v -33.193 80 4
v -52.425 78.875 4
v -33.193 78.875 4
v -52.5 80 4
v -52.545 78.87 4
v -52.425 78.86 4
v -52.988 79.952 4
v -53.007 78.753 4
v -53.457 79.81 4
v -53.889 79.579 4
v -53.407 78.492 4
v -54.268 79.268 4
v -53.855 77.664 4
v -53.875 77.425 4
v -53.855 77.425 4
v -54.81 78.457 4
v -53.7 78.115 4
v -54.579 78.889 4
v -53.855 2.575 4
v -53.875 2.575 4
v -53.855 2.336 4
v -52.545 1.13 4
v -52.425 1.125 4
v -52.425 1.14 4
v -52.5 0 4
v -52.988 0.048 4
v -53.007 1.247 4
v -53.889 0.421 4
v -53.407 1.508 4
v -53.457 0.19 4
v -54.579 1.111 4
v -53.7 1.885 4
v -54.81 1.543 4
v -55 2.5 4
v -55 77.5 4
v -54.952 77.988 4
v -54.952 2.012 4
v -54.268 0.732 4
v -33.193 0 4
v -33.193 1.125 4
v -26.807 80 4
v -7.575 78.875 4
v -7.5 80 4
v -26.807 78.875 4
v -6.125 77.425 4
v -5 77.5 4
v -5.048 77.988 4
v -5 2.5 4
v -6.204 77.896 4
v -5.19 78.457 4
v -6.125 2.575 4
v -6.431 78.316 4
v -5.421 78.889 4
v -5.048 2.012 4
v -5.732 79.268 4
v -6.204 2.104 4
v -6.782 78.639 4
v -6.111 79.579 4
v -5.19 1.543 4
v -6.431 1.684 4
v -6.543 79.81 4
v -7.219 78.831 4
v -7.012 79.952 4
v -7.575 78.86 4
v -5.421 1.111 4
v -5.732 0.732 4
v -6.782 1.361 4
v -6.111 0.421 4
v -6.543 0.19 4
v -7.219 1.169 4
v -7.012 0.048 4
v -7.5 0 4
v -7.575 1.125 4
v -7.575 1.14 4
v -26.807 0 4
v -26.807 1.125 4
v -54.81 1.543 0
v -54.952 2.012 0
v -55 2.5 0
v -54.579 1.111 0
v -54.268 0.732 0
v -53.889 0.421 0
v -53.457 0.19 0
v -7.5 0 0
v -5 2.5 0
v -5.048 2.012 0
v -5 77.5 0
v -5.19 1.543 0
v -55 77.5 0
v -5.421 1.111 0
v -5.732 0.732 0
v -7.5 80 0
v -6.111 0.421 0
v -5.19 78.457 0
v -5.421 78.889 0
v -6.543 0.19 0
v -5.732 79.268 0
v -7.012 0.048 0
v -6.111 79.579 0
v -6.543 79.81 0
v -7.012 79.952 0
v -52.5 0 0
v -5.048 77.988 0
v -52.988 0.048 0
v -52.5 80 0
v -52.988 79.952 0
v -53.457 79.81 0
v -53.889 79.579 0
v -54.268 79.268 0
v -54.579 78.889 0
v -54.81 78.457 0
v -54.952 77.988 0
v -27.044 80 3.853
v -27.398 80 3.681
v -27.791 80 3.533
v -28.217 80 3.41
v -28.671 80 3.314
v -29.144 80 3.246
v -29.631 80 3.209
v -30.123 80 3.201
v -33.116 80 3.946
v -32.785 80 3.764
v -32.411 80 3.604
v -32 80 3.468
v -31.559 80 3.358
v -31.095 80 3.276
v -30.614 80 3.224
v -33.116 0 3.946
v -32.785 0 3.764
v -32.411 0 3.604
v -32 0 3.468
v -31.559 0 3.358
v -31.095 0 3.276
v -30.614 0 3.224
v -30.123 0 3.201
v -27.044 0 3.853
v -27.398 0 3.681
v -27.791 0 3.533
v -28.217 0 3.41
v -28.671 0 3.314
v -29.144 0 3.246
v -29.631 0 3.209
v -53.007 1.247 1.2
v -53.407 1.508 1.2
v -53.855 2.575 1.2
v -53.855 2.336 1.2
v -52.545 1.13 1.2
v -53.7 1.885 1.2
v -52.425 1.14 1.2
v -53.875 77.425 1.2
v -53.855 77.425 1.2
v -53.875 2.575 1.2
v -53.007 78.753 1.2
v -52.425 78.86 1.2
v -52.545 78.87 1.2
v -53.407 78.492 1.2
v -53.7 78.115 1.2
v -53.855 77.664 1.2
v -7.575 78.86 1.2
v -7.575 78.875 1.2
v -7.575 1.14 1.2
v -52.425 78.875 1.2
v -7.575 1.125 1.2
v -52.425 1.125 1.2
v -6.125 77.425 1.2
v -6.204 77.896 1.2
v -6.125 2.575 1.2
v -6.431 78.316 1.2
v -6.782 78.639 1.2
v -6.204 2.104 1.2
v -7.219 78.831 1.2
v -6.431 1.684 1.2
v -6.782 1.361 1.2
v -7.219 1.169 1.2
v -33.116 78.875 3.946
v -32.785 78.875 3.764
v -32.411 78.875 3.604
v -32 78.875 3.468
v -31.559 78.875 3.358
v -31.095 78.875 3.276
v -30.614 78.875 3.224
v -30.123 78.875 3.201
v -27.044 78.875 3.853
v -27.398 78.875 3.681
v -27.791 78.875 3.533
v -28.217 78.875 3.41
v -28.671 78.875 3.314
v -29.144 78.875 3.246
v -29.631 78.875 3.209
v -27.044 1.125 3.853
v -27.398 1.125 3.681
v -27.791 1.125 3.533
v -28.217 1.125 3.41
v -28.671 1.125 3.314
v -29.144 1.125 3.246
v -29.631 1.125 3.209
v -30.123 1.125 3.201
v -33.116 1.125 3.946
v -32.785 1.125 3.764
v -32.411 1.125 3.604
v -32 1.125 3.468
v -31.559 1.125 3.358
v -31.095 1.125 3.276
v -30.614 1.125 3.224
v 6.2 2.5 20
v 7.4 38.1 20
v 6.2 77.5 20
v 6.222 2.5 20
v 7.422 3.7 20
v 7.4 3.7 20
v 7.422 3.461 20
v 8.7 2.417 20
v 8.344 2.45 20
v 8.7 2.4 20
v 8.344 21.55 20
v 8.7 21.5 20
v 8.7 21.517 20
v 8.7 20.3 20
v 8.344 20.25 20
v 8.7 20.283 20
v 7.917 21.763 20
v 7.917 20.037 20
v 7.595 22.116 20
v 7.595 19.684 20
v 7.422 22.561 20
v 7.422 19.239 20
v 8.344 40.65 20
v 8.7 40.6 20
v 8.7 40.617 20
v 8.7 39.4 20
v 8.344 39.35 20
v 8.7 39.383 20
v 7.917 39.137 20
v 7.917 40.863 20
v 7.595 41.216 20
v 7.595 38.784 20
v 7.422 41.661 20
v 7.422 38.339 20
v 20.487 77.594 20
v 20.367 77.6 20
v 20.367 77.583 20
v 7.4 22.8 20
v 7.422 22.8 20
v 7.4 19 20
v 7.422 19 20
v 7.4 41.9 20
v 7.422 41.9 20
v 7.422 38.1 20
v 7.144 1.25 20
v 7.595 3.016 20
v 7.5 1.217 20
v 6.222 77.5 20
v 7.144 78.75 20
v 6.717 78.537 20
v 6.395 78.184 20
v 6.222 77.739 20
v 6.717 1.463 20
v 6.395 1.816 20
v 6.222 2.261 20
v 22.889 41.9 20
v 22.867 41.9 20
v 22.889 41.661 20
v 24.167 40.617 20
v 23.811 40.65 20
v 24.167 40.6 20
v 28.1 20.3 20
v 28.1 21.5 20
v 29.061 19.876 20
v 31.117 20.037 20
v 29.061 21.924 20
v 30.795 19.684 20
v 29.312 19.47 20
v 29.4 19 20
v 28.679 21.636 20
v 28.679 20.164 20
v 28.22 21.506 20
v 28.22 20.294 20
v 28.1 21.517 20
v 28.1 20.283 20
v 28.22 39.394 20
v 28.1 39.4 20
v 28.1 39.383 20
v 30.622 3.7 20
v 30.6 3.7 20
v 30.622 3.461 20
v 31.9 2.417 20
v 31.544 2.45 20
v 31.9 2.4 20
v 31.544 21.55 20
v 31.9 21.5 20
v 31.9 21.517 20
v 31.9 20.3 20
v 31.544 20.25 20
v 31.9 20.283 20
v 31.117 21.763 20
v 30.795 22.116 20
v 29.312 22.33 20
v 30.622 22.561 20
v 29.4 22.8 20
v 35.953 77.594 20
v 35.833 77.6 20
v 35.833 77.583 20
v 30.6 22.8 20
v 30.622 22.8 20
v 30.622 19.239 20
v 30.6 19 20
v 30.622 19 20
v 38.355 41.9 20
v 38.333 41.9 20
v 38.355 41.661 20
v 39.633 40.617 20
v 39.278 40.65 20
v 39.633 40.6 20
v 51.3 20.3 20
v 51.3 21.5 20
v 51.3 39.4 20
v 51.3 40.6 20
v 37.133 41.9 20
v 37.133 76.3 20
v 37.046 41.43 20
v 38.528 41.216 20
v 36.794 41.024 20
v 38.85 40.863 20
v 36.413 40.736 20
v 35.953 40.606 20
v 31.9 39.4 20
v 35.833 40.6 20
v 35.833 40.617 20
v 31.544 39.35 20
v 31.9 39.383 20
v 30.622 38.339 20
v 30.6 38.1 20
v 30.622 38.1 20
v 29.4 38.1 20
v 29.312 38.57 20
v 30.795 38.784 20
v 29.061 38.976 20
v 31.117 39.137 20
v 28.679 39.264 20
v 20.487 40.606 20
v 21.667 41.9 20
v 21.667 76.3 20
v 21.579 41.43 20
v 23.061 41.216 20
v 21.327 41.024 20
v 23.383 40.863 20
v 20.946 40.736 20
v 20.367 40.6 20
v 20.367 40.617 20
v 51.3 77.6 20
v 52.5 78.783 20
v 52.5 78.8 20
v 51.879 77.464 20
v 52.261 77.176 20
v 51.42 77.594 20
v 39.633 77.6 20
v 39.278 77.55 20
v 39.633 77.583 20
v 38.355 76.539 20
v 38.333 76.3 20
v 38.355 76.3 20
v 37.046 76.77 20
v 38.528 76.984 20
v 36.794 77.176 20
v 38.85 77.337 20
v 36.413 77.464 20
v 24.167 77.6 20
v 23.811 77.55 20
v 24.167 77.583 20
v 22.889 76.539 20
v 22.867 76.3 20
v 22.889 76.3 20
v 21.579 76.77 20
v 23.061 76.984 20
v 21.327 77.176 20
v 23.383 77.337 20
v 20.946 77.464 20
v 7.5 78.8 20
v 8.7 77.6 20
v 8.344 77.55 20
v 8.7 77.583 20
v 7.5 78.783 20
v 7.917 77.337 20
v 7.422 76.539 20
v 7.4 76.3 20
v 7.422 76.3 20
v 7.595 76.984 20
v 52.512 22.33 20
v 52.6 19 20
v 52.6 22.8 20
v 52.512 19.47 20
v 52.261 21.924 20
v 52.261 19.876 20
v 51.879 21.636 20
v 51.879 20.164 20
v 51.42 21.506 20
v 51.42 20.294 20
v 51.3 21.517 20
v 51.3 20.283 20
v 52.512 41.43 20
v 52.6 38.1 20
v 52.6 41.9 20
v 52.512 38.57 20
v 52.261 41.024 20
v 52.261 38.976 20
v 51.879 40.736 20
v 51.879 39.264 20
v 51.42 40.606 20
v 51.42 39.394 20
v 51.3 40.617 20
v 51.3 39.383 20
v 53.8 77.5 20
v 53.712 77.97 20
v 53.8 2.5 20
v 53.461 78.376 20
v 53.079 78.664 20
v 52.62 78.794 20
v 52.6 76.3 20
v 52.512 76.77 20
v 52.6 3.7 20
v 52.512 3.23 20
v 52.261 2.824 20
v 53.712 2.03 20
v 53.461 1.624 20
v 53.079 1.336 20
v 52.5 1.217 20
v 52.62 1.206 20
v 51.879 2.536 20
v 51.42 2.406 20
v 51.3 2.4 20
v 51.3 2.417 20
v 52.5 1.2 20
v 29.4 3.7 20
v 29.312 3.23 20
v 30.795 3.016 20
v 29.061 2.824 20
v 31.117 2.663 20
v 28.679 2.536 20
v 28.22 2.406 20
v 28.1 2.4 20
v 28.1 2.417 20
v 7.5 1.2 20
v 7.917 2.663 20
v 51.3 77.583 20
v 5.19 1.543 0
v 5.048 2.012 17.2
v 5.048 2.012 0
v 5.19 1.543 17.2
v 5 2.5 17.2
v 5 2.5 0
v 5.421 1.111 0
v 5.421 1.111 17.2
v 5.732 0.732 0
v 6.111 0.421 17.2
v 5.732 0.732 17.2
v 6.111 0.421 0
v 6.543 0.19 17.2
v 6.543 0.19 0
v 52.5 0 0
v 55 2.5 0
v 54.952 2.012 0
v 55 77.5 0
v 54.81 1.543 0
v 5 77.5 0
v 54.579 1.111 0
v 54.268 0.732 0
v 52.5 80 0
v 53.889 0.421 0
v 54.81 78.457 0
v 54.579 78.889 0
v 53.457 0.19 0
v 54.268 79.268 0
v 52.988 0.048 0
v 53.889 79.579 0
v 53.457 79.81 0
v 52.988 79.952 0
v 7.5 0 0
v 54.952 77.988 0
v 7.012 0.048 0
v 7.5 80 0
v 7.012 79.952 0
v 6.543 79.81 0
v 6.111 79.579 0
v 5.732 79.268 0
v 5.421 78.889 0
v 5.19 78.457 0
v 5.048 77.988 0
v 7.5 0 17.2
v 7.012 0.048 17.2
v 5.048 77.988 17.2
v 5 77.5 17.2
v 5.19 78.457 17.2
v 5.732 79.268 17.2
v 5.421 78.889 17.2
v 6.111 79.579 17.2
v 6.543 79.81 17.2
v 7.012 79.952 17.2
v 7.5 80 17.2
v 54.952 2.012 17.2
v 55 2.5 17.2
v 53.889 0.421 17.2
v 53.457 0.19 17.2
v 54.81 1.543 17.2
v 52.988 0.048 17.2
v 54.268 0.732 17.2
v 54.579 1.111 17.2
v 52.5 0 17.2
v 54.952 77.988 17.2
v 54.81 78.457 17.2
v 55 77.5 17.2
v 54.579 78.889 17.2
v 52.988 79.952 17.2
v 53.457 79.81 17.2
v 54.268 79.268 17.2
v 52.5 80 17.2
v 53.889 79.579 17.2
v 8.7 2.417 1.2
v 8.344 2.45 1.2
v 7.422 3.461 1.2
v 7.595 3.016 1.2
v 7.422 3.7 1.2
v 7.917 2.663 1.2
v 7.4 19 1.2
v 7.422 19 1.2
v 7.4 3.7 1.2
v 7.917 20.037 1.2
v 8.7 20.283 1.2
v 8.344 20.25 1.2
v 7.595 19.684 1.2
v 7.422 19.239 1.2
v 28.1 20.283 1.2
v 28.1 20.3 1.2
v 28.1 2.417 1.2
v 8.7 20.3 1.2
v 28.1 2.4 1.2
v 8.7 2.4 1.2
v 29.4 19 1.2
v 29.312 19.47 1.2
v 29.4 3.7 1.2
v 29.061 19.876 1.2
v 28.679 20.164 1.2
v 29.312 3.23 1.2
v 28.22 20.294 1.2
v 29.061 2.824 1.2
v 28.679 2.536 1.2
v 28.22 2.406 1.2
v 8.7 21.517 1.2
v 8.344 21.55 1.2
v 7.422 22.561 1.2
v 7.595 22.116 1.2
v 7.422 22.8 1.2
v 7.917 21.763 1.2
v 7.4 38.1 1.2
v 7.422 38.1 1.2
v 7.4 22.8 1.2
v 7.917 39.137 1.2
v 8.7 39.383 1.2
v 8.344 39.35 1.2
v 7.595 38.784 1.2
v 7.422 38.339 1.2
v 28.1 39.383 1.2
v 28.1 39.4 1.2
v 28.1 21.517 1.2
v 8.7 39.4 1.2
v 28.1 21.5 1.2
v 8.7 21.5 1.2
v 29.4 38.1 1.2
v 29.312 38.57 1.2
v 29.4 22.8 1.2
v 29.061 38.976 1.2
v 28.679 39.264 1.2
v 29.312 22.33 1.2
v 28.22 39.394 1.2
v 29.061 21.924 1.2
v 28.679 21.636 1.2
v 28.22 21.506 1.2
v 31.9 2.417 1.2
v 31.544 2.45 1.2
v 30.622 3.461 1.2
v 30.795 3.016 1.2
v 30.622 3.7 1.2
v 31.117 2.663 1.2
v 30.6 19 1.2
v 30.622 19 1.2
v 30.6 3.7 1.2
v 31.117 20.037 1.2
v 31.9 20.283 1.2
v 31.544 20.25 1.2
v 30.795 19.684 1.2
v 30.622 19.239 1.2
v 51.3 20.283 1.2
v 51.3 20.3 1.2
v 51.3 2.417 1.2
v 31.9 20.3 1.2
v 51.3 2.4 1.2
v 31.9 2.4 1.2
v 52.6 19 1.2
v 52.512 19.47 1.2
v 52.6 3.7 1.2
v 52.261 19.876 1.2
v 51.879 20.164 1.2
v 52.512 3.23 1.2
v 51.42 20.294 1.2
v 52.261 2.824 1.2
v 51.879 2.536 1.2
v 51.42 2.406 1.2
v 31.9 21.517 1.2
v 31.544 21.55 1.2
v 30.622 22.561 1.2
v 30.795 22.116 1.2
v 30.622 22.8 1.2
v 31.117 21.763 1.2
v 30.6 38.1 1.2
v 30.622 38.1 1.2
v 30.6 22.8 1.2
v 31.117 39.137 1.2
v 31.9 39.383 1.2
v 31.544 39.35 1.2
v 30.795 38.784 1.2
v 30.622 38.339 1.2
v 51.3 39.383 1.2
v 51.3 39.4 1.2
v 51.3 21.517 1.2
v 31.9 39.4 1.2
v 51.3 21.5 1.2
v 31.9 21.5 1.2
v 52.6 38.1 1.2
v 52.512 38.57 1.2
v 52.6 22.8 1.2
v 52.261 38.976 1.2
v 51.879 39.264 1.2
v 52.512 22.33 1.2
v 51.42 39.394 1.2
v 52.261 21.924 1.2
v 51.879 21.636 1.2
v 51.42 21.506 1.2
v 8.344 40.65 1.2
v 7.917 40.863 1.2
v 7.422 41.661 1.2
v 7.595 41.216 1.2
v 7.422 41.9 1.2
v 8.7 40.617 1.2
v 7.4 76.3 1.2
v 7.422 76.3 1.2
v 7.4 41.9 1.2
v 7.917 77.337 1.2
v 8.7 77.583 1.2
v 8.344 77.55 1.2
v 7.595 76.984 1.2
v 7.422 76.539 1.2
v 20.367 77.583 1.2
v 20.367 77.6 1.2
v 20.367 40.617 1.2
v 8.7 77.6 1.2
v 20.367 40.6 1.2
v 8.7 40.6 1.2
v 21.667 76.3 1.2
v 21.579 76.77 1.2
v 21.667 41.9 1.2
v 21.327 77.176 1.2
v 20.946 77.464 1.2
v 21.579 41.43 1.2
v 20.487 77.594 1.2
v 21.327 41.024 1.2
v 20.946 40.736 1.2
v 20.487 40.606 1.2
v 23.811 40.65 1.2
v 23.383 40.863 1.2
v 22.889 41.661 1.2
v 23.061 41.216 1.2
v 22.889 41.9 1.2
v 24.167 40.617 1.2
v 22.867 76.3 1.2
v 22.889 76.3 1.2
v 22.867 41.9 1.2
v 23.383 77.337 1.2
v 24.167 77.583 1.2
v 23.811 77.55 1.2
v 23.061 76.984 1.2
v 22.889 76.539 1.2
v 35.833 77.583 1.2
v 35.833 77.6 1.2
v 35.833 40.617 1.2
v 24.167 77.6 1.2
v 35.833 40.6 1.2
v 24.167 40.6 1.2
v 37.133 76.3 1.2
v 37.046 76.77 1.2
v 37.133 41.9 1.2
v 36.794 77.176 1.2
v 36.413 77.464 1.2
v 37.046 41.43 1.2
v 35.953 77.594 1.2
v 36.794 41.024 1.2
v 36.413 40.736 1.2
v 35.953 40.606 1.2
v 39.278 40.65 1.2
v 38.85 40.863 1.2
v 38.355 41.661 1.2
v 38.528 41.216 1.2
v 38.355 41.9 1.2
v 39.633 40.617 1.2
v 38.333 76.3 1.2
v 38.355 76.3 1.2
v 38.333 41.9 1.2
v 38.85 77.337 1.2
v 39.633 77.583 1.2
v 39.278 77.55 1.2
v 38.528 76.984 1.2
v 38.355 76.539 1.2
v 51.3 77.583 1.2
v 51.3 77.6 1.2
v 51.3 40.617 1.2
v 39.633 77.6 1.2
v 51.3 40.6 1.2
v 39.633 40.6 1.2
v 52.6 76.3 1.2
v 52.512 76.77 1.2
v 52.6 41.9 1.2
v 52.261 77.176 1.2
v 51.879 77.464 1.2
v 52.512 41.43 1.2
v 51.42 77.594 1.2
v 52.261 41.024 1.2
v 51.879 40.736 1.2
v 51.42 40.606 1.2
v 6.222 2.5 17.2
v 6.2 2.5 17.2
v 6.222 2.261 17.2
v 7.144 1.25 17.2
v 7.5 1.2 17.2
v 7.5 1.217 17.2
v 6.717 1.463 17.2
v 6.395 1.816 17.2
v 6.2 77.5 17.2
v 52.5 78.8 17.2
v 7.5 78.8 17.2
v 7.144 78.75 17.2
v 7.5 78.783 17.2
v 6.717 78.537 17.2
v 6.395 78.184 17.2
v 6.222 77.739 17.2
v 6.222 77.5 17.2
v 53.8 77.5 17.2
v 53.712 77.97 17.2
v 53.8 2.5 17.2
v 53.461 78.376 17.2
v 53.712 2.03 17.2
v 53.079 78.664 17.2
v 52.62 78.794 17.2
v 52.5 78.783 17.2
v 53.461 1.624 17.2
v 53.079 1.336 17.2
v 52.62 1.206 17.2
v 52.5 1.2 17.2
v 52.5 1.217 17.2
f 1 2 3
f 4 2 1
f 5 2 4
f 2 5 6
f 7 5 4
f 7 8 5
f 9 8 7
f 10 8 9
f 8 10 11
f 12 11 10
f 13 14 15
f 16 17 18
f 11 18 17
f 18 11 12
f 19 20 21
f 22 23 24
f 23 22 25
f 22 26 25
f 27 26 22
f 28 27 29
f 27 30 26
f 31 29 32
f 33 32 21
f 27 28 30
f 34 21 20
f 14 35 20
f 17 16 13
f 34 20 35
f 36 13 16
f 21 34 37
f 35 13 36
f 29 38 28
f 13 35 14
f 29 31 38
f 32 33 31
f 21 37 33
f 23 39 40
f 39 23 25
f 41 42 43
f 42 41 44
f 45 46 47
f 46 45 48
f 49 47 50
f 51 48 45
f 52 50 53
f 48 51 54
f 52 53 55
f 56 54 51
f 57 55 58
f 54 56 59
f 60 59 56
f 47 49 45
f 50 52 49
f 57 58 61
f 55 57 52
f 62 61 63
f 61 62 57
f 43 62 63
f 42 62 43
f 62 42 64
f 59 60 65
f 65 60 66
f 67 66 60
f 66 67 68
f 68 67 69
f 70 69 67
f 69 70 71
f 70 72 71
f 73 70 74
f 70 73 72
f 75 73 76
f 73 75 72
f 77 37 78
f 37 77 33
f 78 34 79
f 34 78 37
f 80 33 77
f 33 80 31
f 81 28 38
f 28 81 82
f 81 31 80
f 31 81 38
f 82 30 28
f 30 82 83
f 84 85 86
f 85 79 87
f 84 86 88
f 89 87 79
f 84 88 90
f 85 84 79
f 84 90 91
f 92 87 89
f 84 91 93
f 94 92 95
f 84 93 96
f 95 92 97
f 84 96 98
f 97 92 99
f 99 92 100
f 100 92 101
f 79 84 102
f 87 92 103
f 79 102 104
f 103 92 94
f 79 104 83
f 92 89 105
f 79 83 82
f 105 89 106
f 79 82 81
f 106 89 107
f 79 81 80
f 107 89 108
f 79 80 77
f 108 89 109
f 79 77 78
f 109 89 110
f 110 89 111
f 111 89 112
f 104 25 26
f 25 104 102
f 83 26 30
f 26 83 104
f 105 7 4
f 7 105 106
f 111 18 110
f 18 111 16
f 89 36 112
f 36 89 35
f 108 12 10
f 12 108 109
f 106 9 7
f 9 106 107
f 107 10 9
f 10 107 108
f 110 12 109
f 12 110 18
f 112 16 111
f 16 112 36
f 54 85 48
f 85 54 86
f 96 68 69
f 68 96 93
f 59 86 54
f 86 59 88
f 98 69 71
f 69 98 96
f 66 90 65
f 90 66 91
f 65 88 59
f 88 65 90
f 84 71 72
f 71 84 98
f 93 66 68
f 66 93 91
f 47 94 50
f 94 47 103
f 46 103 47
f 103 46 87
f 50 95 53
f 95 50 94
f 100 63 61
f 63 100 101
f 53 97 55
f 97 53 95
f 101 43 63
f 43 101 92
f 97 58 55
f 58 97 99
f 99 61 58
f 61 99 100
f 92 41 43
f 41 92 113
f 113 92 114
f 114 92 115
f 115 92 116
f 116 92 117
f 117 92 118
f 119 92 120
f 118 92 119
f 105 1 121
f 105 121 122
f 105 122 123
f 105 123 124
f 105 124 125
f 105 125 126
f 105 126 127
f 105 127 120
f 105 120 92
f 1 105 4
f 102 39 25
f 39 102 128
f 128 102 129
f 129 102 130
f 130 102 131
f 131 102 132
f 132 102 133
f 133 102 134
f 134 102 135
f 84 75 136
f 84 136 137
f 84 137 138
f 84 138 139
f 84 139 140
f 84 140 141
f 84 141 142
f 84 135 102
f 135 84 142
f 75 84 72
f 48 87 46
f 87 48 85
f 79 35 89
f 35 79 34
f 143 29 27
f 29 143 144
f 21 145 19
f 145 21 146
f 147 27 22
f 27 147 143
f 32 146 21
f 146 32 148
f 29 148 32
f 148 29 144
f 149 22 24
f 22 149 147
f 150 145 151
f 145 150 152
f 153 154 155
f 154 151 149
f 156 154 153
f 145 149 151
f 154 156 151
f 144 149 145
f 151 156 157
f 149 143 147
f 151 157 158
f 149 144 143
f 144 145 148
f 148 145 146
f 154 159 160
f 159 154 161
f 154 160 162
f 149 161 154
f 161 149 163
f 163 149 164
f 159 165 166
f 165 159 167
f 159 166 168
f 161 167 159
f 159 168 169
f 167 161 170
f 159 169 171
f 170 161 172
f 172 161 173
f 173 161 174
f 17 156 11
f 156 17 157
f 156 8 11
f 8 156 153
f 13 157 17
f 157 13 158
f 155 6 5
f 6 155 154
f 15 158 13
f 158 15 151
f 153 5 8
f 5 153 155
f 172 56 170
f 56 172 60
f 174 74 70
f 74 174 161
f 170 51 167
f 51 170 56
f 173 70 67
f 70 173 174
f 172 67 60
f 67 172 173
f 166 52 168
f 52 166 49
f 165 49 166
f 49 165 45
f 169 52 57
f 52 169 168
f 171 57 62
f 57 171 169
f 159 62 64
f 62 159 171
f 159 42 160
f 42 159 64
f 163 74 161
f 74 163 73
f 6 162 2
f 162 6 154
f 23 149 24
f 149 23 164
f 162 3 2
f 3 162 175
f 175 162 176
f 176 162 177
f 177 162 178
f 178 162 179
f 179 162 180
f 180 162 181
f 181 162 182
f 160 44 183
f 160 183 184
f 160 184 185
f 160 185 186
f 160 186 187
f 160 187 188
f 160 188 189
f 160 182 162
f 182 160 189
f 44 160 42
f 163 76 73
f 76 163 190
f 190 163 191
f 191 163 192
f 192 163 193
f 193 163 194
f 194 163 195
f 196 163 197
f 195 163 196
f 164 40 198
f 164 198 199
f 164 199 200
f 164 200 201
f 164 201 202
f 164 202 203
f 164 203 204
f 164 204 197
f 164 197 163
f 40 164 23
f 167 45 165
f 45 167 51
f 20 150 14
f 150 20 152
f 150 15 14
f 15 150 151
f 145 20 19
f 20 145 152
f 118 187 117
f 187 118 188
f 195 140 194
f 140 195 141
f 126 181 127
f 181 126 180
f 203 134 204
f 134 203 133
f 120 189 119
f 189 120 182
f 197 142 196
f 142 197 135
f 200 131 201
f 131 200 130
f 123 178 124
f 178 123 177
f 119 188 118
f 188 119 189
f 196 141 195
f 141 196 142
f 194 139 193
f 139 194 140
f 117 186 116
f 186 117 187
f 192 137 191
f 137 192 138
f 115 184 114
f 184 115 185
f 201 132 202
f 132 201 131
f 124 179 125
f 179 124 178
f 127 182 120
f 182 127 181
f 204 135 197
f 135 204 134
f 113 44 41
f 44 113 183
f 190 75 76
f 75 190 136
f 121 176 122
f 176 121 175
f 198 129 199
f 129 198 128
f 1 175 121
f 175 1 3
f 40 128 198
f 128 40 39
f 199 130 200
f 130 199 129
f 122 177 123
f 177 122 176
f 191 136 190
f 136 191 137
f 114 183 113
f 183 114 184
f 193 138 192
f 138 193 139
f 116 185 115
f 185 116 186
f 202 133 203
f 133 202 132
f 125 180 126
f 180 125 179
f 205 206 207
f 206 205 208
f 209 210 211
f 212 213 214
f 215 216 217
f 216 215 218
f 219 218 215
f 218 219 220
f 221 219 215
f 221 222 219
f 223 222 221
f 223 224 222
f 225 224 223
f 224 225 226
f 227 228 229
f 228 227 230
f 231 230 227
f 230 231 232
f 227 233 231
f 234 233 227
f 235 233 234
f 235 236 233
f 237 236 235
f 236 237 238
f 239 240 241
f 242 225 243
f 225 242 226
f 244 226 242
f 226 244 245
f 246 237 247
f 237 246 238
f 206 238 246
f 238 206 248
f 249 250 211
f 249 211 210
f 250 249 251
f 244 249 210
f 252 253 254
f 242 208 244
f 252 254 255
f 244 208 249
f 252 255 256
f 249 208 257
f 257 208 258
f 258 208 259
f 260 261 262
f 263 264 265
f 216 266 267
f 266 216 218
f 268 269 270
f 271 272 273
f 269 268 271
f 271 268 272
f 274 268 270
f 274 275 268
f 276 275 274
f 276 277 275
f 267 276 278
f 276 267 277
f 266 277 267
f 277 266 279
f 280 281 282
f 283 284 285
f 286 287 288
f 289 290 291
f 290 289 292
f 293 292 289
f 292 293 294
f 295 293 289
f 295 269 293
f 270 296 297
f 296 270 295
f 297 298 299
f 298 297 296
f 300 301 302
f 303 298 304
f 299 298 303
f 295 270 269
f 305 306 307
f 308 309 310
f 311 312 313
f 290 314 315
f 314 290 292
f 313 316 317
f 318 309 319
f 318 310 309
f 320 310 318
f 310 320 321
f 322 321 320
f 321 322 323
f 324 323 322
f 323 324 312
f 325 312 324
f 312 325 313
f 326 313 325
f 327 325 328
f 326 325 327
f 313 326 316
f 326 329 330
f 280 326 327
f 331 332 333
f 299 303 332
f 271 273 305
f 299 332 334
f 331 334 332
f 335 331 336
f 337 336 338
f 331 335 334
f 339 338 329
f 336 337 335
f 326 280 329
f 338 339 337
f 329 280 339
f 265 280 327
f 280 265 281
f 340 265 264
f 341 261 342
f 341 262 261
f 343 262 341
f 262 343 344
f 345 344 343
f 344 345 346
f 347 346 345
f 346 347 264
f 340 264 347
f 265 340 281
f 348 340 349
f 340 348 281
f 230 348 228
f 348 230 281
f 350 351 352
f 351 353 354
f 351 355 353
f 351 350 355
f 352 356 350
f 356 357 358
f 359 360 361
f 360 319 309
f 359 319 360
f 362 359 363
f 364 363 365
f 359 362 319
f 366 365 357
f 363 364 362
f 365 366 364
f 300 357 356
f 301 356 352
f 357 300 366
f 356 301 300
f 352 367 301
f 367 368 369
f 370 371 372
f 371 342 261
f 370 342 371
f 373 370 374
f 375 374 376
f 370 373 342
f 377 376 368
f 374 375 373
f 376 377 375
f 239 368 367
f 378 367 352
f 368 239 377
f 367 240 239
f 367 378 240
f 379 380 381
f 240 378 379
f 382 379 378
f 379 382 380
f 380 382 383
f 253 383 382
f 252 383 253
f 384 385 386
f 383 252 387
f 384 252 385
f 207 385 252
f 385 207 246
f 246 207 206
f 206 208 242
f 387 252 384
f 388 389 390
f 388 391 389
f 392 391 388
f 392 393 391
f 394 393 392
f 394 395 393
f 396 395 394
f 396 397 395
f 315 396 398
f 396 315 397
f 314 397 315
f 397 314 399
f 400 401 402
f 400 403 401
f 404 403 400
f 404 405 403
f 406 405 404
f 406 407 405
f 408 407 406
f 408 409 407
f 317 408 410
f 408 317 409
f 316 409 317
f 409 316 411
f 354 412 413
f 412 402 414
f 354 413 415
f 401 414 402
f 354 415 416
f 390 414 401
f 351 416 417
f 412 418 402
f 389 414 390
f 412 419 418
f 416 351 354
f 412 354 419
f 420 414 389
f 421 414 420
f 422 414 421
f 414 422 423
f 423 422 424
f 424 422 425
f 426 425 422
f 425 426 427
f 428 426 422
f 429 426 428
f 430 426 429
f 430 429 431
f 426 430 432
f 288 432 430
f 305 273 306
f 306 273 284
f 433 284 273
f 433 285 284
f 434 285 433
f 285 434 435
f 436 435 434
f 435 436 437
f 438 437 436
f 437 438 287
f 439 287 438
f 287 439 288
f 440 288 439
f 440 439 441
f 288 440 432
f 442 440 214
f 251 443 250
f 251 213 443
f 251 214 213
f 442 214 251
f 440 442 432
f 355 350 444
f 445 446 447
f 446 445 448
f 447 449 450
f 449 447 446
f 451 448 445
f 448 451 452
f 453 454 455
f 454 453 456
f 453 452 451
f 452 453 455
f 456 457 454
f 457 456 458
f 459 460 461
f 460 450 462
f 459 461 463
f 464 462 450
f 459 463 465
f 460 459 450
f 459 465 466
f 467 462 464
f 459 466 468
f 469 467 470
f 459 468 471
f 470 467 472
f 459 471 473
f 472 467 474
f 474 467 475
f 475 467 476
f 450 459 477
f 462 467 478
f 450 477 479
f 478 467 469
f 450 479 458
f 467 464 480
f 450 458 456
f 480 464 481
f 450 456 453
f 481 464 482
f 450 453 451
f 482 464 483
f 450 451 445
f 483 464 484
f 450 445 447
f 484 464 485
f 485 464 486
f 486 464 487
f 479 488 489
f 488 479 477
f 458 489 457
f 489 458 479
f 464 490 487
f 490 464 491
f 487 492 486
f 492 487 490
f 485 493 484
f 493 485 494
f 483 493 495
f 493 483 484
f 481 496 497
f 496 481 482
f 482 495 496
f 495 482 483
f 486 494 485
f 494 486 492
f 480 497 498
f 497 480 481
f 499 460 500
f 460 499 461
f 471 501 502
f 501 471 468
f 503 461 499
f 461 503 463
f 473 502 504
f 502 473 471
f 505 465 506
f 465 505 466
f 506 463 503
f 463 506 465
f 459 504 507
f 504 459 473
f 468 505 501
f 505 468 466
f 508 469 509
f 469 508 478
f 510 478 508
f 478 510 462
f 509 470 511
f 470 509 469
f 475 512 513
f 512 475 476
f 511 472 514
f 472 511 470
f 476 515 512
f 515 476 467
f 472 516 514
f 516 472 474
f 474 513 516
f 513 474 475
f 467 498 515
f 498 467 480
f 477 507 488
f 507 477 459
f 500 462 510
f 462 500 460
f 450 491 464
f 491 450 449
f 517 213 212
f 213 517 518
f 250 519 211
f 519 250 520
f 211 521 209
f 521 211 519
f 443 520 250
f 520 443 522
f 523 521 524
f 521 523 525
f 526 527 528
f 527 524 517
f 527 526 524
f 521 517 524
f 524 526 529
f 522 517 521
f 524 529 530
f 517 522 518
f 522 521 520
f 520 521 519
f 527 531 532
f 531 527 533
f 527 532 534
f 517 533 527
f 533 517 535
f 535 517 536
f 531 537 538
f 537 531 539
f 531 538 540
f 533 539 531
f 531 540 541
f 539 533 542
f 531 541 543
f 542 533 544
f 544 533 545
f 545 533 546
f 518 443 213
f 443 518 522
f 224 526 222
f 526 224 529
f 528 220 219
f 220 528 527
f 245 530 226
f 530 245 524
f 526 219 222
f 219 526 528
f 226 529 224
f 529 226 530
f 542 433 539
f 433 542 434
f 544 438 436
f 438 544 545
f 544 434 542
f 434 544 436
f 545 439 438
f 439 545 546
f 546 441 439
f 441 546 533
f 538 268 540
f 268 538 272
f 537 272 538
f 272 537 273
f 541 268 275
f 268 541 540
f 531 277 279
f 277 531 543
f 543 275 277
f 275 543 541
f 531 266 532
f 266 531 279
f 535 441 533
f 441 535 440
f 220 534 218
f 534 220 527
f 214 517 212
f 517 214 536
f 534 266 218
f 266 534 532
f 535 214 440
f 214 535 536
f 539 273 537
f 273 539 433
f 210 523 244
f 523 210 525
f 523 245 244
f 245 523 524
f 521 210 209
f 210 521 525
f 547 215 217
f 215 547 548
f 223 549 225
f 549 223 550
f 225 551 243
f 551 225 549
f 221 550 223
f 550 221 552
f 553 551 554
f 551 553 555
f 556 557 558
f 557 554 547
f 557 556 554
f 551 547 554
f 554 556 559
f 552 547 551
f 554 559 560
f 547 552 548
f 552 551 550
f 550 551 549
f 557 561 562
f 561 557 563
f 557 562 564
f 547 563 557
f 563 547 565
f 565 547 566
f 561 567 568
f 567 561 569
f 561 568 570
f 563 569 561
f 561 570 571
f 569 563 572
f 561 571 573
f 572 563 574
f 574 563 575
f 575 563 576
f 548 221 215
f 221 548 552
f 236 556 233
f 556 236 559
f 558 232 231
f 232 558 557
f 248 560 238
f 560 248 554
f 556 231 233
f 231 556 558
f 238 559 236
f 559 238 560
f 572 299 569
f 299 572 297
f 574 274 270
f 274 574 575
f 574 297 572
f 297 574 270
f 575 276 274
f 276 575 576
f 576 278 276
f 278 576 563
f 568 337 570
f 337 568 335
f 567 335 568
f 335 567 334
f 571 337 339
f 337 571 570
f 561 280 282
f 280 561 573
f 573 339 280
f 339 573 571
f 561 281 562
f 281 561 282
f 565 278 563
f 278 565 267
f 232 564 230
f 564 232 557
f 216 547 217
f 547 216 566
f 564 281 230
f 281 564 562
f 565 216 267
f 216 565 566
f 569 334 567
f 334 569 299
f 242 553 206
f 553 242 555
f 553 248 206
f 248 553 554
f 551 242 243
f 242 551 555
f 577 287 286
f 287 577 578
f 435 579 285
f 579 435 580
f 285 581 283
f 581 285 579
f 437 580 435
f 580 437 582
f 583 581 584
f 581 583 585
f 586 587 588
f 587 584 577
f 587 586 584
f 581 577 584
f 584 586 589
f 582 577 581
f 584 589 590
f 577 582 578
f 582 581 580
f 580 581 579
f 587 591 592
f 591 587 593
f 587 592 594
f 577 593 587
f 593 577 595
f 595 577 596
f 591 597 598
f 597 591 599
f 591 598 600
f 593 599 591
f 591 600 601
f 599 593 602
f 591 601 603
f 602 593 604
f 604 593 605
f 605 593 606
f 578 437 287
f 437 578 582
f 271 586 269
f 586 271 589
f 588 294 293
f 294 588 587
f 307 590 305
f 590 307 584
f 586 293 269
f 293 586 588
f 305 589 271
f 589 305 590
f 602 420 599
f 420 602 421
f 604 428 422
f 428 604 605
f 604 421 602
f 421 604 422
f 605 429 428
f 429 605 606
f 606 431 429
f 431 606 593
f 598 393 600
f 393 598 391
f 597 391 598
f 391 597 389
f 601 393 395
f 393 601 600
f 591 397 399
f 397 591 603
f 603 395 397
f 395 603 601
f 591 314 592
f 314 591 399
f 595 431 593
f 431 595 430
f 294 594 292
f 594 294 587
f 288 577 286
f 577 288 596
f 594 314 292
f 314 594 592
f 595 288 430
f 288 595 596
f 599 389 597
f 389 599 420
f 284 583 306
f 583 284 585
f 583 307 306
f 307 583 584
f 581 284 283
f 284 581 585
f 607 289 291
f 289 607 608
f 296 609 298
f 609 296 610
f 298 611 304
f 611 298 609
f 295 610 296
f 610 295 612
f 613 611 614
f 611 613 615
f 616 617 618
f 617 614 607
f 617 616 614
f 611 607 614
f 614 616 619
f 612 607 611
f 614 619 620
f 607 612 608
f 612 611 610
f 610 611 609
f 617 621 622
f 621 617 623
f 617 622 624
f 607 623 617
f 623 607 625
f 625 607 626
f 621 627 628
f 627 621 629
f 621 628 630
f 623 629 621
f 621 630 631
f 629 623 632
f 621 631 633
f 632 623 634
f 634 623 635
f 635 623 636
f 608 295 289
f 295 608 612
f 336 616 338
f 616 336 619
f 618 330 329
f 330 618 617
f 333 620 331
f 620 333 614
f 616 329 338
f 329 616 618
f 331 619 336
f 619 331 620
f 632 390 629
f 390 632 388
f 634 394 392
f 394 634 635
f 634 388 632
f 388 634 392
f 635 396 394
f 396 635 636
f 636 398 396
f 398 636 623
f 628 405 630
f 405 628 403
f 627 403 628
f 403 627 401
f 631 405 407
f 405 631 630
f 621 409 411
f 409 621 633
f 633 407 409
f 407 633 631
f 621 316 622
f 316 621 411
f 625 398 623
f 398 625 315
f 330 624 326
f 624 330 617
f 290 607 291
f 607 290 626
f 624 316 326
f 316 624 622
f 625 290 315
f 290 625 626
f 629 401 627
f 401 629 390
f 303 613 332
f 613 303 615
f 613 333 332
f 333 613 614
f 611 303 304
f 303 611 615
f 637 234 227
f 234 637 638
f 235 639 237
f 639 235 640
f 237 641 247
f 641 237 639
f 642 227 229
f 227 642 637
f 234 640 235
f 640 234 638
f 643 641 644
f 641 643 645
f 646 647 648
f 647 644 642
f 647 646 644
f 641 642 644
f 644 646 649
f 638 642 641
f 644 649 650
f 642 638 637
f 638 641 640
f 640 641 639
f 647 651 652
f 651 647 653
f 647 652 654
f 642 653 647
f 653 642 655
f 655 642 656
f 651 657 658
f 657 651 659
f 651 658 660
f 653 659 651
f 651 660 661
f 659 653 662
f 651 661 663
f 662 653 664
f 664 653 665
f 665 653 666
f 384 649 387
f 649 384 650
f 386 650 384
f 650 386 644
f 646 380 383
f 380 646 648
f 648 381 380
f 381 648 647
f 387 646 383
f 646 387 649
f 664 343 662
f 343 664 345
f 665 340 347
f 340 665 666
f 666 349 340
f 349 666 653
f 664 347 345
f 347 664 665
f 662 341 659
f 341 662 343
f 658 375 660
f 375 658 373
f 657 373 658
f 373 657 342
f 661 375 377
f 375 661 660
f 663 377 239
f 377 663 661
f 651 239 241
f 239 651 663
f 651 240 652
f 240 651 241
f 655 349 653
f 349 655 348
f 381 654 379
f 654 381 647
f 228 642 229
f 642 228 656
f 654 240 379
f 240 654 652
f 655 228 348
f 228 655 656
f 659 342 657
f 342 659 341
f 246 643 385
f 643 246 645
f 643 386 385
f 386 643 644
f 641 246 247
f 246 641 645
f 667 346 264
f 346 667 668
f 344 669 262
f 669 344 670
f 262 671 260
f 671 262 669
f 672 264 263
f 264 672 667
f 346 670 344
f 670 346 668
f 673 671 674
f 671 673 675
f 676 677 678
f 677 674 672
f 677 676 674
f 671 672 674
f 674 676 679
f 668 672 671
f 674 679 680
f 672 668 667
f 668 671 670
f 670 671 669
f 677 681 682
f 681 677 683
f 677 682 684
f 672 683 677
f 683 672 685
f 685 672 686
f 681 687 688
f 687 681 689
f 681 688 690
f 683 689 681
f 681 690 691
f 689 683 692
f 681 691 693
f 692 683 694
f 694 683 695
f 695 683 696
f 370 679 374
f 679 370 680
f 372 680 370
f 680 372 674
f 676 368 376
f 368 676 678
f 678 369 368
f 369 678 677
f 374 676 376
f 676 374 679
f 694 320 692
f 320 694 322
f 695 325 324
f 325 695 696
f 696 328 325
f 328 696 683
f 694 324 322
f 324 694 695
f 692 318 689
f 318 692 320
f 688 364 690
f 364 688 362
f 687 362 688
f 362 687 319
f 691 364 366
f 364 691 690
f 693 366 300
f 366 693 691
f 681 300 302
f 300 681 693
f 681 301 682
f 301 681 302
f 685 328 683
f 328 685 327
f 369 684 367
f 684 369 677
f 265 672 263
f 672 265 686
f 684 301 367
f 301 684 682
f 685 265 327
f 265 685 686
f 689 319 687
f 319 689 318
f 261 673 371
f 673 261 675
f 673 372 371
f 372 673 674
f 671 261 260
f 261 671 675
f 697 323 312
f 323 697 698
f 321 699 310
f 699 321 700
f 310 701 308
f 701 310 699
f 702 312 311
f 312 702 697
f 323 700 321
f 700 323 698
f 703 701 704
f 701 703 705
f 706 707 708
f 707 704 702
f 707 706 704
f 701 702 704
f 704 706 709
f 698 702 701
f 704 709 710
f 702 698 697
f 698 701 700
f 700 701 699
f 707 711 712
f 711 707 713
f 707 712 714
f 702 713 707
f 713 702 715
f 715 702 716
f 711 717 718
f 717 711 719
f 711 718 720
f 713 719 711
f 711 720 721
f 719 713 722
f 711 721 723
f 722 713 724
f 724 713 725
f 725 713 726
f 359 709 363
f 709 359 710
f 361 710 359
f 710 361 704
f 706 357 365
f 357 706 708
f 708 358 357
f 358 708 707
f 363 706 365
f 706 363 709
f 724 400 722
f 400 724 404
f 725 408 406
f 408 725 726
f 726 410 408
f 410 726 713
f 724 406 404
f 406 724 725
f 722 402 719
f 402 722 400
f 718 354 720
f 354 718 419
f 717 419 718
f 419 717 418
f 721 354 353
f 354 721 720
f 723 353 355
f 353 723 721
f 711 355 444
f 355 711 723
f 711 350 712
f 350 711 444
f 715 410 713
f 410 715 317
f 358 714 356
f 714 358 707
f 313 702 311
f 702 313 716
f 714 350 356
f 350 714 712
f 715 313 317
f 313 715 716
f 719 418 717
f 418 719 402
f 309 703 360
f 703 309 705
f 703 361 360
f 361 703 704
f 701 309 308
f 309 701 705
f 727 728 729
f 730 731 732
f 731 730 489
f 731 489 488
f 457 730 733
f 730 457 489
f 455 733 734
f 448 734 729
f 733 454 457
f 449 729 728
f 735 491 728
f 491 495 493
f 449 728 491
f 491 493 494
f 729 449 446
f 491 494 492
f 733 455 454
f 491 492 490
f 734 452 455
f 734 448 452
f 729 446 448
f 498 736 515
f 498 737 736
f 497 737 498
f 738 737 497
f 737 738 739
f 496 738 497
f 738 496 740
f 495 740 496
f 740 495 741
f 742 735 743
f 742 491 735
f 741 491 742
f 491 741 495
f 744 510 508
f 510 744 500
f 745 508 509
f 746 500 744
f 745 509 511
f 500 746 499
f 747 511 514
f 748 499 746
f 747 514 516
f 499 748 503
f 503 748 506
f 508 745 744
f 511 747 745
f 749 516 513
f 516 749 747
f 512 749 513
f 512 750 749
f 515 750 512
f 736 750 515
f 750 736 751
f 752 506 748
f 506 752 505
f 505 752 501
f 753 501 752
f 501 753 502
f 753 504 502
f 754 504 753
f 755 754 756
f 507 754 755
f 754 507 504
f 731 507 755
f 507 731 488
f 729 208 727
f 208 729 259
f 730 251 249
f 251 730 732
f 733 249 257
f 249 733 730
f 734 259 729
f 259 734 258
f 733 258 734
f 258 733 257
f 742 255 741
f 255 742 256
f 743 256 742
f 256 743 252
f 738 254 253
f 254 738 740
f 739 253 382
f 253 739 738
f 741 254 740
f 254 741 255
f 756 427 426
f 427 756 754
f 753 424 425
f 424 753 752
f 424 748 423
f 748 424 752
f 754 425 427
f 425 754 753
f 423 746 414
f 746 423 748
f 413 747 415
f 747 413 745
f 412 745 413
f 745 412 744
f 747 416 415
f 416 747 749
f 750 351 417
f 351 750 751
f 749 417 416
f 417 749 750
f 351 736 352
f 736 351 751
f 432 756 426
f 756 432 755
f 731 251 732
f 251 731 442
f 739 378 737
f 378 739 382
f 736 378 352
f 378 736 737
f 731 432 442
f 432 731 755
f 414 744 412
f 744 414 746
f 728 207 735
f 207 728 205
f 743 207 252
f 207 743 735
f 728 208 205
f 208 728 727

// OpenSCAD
/*
 * (C)Copyright 2020 Kent Forschmiedt
 *
 * Released under Creative Commons
 */
 
use <MCAD/boxes.scad>
// use <MCAD/regular_shapes.scad>

/* [Dimensions] */

Length = 80;
Width = 50;
Height = 20;
Radius = 2.5;
Thickness = 1.2;

/* [Interior] */

Rounded = false;
Group1Span = 50;    // [100]
Split = "W";        // [L:Length, W:Width]
LDiv1 = 2;
WDiv1 = 2;
LDiv2 = 1;
WDiv2 = 3;


/* [Lid] */

LidHeight = 4;
LidThick = 1.2;
LidRounded = false;
LidRelief = 0.15;

/* [Options] */
Make_Box = true;
Make_Lid = true;

$fa = 0.5;
$fs = 0.5;

module RoundedBox(size, radius, sidesonly=false, center=false)
{
    if (center) {
        roundedBox(size, radius, sidesonly);
    } else {
        translate([size[0]/2, size[1]/2, size[2]/2])
            roundedBox(size, radius, sidesonly);
    }
}

//
// Base implementation of RoundedShell
// This is always centered because of roundedBox
//
module _RoundedShell(size, radius, thickness)
{
    difference() {
        roundedBox(size, radius, sidesonly=true);
        roundedBox([size[0] - 2*thickness,
                    size[1] - 2*thickness,
                    size[2] + .1],
                    max(0, radius - thickness),
                    sidesonly=true);
    }
}

module RoundedShell(size, radius, thickness, center=false)
{
    if (center) {
            _RoundedShell(size, radius, thickness);
    } else {
        translate([size[0]/2, size[1]/2, size[2]/2])
            _RoundedShell(size, radius, thickness);
    }
}

module render_box()
{
    workingWidth = Width - Thickness - 2*LidThick;
    workingLength = Length - Thickness - 2*LidThick;
    
    width1 = Split == "L"? (Group1Span * workingWidth * 0.01) : workingWidth;
    length1 = Split == "L"? workingLength : (Group1Span * workingLength * 0.01);
    wdivsize1 = width1 / WDiv1;
    ldivsize1 = length1 / LDiv1;

    w2off = (Split == "L"? width1 : 0);
    width2 = Split == "L"? (workingWidth - width1) : workingWidth;
    l2off = (Split == "L"? 0 : length1);
    length2 = Split == "L"? workingLength : (workingLength - length1);

    wdivsize2 = width2 / WDiv2;
    ldivsize2 = length2 / LDiv2;

    difference() {
        RoundedBox(size=[Width, Length, Height], radius=Radius, sidesonly=true);

        // subtract the internal boxes
        for (woff = [Thickness + LidThick : wdivsize1 : width1],
             loff = [Thickness + LidThick : ldivsize1 : length1]) {
            translate([woff,loff,Thickness])
                RoundedBox(size=[wdivsize1-Thickness,
                                 ldivsize1-Thickness,
                                 Height+Radius],
                           radius=Radius-Thickness,
                           sidesonly=!Rounded);
        }
        // Group 2
        if (Group1Span < 100) {
            for (woff = [Thickness : wdivsize2 : width2],
                 loff = [Thickness : ldivsize2 : length2]) {
                translate([w2off + woff + Thickness, l2off + loff + Thickness, Thickness])
                    RoundedBox(size=[wdivsize2-Thickness,
                                    ldivsize2-Thickness,
                                    Height+Radius],
                               radius=Radius - Thickness,
                               sidesonly=!Rounded);
            }
        }
        // subtract the rim for the lid
        translate([-1, -1, Height - LidHeight + LidThick])
            RoundedShell(size=[Width + 2, Length + 2, LidHeight + 1],
                         radius=Radius + 1, thickness=LidThick + 1);
    }
}

module render_rlid()
{
    difference() {
        RoundedBox(size=[Width, Length, LidHeight + Radius + 5],
                   radius=Radius, sidesonly=false);
        translate([LidThick-LidRelief/2, LidThick-LidRelief/2, LidThick])
            RoundedBox(size=[Width - 2*LidThick + LidRelief,
                            Length - 2*LidThick + LidRelief,
                            LidHeight+2*Radius],
                       radius=max(Radius-LidThick, 0),
                       sidesonly=false);
        // square off the bottom of the lid
        translate([-.5, -.5, LidHeight+Radius/2])
            cube([Width + 1, Length + 1, LidHeight + 10], center=false);
        // Thumb notch
        translate([Width/2,Length/2,LidHeight+LidThick+Radius/2])
        rotate([90,0,0])
            scale([1, .5, 1])
            cylinder(h=Length + 1, r=LidHeight, center=true);
    }
}

module render_sqlid()
{
    difference() {
        RoundedBox(size=[Width, Length, LidHeight],
                   radius=Radius, sidesonly=true, center=true);
        translate([0, 0, LidThick])
            RoundedBox(size=[Width - 2*LidThick + LidRelief,
                            Length - 2*LidThick + LidRelief,
                            LidHeight],
                       radius=max(0, Radius-LidThick)+LidRelief,
                       sidesonly=true, center=true);
        // Thumb notch
        translate([0,0,LidHeight/2+LidThick])
        rotate([90,0,0])
            scale([1, .5, 1])
            cylinder(h=Length + 1, r=LidHeight, center=true);
    }
}

module render_lid()
{
    if (LidRounded)
        render_rlid();
    else
        render_sqlid();
}

if (Make_Lid)
    translate([-Width/2 - 5, Length / 2, LidHeight / 2])
        render_lid();

if (Make_Box)
    translate([5, 0, 0])
        render_box();
